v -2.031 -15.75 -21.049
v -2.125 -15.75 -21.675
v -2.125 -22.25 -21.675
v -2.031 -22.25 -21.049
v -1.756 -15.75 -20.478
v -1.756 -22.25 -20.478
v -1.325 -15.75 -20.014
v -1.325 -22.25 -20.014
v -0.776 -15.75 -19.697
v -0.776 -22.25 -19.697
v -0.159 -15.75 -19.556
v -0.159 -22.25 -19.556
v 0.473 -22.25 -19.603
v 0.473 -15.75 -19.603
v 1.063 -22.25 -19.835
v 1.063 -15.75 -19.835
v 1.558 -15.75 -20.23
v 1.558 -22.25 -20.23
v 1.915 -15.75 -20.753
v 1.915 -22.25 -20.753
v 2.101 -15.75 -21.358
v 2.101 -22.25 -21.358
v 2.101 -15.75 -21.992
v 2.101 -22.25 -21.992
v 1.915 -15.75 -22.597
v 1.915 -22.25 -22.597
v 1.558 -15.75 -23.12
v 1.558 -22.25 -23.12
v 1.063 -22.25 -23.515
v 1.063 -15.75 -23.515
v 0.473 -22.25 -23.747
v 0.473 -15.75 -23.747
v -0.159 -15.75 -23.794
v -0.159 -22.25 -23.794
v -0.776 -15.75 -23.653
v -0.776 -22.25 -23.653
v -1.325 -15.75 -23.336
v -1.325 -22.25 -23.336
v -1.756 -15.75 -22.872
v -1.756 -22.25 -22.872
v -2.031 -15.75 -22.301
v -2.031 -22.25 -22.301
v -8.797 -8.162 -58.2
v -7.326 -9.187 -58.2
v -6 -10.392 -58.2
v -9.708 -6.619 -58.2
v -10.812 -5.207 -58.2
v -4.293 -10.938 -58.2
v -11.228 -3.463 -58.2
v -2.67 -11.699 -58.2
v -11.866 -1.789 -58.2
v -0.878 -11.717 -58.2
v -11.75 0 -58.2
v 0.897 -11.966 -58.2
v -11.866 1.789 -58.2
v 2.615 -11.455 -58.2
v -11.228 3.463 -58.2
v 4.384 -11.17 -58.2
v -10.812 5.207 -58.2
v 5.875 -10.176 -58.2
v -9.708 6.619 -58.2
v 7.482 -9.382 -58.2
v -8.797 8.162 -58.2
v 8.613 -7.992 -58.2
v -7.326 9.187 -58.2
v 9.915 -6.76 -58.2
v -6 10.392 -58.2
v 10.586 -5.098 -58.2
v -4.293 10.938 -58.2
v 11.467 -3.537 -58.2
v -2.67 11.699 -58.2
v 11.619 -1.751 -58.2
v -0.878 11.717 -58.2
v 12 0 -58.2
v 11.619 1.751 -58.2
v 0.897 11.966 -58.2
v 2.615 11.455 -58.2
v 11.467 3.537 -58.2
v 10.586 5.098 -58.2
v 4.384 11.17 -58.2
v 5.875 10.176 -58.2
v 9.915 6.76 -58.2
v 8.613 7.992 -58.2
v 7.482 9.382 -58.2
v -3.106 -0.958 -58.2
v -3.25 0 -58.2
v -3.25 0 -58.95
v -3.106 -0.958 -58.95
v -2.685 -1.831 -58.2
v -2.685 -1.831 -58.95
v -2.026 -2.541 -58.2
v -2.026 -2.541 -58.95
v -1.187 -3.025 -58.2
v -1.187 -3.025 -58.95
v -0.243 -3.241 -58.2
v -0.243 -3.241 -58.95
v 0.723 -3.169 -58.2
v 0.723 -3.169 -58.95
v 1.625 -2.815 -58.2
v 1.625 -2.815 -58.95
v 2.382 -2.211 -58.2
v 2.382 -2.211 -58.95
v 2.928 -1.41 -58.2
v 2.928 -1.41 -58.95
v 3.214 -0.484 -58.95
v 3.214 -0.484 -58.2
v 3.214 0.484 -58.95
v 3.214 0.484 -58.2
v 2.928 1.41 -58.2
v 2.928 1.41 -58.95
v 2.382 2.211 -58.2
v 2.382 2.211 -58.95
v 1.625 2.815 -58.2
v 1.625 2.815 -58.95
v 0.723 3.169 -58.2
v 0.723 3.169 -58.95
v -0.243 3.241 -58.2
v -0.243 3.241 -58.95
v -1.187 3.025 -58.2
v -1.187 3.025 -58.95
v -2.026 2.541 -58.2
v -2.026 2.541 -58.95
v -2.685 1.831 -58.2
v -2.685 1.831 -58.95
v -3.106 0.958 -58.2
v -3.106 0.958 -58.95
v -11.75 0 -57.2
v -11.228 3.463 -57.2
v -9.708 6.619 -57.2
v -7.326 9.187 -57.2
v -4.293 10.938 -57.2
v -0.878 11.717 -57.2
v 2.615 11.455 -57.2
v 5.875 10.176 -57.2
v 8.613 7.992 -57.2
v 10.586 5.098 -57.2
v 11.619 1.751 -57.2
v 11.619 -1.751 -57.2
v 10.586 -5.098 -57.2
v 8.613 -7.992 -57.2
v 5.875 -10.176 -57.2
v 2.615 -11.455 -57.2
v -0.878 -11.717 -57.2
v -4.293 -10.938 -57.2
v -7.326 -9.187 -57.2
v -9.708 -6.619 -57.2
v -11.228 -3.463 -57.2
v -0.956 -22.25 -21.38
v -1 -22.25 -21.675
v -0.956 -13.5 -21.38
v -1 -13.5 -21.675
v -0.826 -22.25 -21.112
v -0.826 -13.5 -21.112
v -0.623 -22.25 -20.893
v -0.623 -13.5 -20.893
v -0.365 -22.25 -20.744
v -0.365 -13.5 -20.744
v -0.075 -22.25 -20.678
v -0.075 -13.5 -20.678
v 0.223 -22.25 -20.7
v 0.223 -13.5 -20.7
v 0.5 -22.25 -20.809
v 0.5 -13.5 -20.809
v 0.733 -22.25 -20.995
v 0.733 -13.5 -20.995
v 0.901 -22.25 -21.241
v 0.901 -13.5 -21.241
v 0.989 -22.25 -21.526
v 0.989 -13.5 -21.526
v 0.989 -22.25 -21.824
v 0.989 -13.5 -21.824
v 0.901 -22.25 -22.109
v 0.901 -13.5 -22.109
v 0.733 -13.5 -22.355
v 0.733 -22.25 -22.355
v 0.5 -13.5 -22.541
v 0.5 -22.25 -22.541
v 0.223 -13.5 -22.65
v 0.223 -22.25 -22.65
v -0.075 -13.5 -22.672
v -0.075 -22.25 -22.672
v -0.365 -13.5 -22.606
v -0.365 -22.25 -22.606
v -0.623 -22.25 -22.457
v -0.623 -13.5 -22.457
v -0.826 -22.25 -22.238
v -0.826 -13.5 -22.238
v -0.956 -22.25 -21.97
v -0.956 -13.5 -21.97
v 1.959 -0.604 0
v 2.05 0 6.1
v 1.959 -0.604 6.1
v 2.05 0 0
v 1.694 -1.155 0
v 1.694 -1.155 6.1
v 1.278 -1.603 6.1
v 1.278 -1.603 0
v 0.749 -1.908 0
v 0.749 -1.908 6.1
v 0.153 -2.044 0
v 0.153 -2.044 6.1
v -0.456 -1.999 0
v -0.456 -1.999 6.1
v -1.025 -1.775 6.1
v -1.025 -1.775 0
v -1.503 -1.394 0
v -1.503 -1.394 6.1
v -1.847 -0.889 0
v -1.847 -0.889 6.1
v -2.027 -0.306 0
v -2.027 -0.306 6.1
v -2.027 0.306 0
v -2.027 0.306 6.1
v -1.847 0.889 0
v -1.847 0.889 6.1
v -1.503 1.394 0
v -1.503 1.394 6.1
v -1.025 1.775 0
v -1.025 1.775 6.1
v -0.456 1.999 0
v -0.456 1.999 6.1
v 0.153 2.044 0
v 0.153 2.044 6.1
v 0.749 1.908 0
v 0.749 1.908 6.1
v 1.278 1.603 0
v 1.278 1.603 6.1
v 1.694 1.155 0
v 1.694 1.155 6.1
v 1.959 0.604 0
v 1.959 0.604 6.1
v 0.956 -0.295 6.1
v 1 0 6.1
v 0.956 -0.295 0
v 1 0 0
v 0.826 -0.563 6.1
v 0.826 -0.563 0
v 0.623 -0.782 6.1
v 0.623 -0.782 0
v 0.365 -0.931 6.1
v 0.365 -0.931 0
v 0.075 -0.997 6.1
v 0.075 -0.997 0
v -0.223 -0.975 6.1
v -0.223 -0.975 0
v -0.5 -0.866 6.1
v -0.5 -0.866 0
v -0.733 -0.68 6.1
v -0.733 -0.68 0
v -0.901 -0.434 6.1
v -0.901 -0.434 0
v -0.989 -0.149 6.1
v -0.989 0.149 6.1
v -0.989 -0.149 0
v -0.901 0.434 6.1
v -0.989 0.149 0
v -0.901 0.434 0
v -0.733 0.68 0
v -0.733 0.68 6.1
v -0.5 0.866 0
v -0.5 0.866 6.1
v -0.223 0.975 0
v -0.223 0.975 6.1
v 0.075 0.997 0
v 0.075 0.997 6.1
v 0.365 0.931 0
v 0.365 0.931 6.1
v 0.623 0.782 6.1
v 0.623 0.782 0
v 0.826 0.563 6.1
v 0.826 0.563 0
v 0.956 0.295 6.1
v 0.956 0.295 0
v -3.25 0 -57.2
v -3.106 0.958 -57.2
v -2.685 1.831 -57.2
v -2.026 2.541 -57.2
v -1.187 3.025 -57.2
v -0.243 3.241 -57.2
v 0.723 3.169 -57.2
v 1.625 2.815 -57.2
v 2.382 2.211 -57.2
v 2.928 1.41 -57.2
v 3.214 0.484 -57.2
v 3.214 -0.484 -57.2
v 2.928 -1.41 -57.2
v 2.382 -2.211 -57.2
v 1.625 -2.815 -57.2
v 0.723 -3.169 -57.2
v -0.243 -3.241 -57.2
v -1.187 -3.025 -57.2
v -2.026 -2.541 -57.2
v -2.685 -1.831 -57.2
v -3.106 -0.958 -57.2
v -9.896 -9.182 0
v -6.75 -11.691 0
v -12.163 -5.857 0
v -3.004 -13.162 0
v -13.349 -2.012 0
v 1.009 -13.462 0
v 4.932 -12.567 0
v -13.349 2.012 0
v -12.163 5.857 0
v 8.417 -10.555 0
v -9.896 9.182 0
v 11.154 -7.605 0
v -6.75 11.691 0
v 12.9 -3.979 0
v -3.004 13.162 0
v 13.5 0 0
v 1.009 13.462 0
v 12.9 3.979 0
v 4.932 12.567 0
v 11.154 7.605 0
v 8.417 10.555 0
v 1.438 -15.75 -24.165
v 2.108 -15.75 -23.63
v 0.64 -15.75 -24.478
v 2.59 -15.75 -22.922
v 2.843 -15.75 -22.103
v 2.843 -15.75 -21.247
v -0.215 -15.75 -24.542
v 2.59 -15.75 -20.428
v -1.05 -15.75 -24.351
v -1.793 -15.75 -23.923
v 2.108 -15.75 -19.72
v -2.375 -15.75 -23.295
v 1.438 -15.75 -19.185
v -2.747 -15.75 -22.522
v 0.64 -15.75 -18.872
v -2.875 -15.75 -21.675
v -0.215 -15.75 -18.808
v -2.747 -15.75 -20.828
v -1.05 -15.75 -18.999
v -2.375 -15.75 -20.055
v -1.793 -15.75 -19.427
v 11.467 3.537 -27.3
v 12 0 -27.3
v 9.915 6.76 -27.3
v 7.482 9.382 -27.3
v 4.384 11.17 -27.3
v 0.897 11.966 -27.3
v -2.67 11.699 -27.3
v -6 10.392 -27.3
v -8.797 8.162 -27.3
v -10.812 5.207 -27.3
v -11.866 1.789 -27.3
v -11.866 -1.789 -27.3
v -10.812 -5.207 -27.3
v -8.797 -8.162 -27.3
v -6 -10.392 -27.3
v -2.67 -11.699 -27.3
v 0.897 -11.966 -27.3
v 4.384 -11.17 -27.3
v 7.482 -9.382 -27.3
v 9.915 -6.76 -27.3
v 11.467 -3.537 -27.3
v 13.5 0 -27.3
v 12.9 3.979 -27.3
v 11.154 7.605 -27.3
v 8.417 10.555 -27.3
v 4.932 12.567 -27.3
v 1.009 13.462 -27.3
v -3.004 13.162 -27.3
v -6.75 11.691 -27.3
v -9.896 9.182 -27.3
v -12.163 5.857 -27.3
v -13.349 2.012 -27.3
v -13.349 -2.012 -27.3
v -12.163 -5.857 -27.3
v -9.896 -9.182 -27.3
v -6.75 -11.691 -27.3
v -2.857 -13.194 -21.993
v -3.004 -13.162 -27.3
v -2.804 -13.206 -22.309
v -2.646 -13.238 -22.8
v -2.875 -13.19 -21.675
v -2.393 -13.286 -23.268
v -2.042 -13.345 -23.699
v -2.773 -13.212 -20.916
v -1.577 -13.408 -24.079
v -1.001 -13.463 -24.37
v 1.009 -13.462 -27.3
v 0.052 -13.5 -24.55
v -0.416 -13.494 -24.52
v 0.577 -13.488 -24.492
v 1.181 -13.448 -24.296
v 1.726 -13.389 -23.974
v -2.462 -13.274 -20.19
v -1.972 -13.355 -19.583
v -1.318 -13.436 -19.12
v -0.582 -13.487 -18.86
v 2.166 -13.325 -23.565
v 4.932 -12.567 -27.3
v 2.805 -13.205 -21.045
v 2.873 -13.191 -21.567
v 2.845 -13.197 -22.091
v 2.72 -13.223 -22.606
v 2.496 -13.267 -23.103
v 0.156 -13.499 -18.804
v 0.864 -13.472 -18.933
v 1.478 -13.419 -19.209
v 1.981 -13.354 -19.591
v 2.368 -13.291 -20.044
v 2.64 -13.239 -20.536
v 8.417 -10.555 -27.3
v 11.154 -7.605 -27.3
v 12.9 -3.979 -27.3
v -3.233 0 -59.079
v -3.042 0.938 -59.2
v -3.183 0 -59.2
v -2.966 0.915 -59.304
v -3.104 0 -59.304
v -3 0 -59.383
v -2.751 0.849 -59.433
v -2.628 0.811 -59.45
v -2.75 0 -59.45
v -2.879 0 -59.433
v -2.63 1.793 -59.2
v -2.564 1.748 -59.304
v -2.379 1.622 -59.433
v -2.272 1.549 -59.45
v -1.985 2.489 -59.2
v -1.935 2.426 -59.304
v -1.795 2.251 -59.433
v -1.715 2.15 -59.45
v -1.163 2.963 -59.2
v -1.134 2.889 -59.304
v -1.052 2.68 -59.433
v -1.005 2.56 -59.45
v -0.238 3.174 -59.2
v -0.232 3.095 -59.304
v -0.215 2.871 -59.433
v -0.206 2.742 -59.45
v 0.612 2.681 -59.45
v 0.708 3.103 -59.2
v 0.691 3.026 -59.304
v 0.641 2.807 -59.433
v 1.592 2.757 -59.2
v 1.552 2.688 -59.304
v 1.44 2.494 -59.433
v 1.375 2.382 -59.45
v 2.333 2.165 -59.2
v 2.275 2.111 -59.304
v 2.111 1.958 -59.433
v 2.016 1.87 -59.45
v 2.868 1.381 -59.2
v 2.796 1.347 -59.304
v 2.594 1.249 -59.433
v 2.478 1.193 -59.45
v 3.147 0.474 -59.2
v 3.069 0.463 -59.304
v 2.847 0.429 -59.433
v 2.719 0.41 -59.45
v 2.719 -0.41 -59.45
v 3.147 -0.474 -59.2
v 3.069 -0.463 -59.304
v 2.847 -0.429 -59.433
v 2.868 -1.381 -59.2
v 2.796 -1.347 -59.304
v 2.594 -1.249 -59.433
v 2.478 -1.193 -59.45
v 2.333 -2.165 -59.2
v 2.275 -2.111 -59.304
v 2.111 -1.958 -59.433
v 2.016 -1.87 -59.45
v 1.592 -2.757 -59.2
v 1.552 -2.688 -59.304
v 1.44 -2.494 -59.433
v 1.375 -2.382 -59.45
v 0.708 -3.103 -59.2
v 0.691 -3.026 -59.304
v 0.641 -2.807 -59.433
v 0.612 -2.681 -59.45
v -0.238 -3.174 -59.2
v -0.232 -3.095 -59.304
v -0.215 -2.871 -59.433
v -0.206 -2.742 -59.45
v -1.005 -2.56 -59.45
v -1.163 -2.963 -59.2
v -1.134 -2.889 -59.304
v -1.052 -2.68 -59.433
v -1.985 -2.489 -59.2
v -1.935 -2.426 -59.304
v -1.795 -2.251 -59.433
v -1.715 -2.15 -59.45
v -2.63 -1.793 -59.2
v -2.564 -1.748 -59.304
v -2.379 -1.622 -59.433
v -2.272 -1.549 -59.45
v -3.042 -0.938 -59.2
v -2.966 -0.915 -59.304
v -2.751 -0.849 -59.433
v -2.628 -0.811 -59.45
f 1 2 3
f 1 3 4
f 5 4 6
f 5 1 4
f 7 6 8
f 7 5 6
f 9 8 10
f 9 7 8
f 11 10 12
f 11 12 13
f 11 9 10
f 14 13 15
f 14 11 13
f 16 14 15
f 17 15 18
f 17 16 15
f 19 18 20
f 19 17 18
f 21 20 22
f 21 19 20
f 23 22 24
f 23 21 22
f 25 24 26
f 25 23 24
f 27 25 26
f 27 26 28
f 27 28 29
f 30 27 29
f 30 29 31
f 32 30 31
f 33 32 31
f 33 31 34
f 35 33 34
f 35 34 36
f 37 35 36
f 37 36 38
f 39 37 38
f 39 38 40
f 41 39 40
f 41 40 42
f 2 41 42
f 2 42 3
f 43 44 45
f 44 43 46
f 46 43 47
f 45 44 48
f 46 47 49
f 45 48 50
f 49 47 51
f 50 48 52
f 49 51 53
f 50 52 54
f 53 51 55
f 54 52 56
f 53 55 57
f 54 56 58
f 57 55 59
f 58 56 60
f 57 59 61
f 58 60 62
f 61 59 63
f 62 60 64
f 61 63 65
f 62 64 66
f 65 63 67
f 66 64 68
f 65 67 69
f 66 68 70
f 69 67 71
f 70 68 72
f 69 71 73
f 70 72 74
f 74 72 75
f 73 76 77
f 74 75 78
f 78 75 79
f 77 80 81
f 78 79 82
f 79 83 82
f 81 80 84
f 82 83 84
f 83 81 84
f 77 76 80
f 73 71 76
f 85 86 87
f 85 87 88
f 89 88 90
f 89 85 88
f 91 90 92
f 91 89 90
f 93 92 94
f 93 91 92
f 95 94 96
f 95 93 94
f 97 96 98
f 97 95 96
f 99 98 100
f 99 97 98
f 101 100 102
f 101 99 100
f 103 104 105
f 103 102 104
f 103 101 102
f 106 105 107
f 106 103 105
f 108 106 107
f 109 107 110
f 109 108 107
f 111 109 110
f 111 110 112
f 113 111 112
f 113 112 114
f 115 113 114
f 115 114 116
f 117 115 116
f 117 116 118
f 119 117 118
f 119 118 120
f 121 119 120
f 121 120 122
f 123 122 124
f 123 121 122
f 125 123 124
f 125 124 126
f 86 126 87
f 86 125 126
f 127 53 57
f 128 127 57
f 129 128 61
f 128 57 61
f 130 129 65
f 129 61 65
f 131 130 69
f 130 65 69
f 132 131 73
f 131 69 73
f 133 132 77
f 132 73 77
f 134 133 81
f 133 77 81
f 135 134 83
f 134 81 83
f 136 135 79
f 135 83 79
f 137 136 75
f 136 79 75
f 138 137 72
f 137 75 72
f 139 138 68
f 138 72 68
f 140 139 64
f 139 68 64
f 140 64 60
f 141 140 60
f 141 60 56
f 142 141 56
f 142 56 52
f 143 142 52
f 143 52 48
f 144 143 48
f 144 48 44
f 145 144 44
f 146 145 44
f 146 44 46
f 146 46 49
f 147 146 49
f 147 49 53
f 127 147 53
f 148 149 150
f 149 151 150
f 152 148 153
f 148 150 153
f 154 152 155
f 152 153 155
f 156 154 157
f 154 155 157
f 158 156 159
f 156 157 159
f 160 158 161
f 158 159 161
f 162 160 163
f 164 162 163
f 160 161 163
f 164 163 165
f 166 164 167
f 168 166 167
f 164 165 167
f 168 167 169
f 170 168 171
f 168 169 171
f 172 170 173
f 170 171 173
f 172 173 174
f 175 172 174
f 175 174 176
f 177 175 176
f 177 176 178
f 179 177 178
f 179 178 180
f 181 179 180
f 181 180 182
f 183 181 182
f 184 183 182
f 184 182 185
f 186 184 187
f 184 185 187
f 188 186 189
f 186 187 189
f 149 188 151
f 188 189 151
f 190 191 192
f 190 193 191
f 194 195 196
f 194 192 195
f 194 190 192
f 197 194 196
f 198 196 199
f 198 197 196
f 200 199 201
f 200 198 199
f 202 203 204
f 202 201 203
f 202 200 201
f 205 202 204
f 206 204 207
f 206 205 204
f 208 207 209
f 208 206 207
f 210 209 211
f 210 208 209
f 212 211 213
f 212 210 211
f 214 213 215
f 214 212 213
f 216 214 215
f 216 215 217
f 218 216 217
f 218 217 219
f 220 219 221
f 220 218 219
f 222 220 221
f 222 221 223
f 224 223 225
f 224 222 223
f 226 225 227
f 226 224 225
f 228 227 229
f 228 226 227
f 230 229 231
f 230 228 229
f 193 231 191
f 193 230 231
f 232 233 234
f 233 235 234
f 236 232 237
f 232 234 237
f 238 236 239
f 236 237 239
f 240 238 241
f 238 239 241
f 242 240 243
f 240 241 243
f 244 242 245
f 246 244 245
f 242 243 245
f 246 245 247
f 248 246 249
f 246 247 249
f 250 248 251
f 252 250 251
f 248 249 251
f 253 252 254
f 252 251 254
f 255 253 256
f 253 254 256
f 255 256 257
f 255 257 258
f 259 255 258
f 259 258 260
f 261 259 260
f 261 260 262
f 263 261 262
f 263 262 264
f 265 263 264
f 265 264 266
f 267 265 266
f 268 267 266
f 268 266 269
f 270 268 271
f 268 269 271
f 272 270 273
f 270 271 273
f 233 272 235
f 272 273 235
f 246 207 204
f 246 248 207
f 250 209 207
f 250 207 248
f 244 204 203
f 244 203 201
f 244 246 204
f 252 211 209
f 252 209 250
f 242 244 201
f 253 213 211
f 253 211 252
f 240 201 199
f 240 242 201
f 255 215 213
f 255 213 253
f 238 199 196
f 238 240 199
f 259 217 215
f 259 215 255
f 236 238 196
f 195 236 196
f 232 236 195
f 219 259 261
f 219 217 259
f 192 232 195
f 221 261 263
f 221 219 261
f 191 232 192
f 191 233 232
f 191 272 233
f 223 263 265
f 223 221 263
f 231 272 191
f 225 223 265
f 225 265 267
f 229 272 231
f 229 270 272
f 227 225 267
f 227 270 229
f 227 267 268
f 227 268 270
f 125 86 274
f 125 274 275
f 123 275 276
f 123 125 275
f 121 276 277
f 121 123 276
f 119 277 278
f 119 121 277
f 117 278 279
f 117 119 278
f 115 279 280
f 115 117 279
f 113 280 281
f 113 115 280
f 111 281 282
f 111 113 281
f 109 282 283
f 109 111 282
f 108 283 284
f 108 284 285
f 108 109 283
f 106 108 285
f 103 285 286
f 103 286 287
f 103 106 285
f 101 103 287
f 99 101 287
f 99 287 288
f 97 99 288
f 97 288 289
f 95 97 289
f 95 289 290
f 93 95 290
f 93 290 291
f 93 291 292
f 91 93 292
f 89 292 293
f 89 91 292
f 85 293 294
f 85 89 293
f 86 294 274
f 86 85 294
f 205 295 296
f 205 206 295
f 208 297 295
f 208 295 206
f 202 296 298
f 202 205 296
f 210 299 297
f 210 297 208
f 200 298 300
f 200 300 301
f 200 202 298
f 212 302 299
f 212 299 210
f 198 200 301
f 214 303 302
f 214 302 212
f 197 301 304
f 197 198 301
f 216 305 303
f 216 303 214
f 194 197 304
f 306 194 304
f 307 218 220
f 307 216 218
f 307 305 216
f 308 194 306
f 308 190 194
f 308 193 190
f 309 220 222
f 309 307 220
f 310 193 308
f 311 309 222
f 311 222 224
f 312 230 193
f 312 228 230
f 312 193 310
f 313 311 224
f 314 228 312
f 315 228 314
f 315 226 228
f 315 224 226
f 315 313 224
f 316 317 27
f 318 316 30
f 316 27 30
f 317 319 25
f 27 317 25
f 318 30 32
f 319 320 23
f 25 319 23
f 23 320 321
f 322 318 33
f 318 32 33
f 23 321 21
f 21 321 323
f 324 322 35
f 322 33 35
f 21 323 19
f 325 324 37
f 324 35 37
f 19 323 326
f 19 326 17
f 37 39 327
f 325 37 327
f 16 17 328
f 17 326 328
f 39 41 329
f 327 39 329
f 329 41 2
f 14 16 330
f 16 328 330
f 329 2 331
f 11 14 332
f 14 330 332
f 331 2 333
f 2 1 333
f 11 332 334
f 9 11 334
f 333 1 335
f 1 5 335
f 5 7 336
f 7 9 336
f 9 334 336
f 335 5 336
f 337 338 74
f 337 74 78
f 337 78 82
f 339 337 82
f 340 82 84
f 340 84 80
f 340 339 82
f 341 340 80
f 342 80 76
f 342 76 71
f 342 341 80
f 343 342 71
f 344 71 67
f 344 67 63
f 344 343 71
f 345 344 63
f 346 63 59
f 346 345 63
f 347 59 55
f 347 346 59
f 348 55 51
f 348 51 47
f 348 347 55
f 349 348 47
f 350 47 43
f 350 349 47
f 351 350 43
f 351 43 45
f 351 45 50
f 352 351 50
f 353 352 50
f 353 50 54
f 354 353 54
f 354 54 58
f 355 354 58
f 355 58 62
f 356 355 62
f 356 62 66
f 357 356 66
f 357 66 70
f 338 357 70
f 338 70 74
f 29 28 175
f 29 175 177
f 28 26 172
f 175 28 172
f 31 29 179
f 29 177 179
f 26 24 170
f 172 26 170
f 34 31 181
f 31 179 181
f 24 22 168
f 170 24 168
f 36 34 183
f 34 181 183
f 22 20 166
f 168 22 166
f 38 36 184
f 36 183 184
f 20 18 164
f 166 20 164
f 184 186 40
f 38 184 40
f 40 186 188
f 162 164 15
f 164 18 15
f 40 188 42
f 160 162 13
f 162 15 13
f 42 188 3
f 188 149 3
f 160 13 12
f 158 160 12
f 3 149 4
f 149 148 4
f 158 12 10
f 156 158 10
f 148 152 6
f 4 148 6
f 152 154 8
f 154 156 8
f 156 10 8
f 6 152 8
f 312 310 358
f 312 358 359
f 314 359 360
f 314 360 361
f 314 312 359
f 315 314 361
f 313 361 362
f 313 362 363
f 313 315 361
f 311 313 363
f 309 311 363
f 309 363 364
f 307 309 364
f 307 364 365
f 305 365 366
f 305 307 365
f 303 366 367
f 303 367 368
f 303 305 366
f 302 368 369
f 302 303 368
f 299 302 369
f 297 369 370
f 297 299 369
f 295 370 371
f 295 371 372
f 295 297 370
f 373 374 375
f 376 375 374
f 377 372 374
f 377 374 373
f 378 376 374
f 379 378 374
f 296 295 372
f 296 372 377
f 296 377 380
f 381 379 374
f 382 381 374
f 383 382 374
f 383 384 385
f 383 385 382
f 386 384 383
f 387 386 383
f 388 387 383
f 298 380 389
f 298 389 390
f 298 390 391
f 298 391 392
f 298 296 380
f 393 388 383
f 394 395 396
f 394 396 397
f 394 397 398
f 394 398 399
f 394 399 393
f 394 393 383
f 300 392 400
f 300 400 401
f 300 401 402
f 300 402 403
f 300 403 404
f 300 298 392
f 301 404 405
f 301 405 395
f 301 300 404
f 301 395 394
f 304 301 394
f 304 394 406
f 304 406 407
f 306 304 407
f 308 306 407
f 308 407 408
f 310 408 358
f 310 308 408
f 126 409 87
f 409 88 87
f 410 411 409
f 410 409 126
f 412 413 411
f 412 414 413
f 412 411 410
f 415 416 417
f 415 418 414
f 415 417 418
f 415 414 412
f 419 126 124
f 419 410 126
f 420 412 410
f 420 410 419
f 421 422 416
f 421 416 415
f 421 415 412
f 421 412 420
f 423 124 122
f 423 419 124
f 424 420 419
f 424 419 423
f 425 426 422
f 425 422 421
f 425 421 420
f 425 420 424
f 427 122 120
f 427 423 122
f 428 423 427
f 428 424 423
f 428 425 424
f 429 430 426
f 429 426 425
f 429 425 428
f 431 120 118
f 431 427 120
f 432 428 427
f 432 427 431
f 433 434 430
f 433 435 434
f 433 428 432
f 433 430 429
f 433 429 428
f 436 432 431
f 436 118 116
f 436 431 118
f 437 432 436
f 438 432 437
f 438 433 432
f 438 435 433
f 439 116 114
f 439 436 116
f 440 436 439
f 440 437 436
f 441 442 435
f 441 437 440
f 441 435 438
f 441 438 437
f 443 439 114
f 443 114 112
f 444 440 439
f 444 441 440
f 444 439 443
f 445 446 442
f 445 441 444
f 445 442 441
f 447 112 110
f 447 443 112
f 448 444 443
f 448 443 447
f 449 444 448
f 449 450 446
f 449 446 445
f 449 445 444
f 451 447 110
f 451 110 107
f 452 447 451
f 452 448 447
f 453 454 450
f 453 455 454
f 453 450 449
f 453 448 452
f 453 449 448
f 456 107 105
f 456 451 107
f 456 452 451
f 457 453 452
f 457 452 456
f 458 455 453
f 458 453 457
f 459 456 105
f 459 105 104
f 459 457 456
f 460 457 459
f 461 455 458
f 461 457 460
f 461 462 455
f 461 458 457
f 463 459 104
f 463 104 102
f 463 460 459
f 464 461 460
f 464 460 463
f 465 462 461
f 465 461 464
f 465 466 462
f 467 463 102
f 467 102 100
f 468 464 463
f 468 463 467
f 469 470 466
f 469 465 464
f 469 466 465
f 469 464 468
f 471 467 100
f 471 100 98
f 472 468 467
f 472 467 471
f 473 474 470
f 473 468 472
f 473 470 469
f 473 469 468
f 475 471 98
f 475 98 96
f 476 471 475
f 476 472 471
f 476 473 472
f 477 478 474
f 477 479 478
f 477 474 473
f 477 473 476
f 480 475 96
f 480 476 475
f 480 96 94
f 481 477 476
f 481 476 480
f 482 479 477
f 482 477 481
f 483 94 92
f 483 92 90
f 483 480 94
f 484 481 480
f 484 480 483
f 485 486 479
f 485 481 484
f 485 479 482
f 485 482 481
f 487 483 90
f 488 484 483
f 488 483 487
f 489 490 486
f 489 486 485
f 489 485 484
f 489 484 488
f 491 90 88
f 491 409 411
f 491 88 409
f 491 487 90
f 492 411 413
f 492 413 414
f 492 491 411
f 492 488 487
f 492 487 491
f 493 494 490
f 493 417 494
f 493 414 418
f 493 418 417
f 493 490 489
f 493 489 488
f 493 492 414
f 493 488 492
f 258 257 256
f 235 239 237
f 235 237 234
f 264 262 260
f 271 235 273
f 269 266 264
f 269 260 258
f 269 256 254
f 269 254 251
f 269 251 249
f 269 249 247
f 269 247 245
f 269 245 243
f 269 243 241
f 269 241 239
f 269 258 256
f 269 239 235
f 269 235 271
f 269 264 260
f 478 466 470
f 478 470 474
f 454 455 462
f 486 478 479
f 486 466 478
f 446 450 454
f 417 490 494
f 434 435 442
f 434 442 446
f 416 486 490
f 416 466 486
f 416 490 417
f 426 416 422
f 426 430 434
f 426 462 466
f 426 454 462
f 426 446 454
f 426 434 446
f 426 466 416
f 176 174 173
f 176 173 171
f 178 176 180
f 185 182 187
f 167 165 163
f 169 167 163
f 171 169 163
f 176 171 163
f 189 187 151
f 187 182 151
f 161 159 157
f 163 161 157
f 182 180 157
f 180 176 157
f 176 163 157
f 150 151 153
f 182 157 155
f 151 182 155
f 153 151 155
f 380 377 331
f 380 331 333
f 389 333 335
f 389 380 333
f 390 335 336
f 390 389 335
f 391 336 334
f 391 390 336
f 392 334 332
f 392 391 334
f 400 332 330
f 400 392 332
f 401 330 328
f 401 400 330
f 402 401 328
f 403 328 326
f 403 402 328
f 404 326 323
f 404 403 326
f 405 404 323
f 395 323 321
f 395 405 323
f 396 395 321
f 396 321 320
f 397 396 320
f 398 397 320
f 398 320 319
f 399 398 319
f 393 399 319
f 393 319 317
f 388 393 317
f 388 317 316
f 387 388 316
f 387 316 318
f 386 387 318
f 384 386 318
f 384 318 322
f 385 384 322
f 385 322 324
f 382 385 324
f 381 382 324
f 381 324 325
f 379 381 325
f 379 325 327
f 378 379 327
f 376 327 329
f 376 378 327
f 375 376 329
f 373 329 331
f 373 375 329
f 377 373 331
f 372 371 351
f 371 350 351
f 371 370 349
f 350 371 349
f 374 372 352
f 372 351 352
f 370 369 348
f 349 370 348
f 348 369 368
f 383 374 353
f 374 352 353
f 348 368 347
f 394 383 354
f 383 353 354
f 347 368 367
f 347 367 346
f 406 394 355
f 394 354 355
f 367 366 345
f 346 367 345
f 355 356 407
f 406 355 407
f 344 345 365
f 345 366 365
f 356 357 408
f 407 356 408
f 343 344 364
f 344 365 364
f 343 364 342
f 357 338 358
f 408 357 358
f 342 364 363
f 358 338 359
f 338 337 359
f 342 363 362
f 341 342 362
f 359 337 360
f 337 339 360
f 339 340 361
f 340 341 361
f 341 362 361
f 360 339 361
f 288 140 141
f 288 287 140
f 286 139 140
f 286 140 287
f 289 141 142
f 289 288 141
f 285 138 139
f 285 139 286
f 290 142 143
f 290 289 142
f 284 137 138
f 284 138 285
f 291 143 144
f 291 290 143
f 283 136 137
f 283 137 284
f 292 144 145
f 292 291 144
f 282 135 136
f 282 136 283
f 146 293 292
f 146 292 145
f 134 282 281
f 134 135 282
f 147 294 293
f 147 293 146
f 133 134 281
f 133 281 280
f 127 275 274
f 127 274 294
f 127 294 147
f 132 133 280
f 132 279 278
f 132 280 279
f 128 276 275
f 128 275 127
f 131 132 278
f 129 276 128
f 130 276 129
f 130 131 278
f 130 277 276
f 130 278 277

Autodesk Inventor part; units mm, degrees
ref_plane "YZ Plane" through (0, 0, 0) normal (1, 0, 0) x (0, 1, 0)
ref_plane "XY Plane" through (0, 0, 0) normal (0, 0, 1) x (1, 0, 0)
sketch "Sketch1" plane through (0, 0, 0) normal (0, 0, 1) x (1, 0, 0)
  circle A0 centre (0, 0) radius 13.5
  circle A1 centre (0, 0) radius 2.05
  circle A2 centre (0, 0) radius 12
  circle A3 centre (0, 0) radius 1
  dimension "d0" = 27
  dimension "d3" = 4.1
  dimension "d6" = 24
  dimension "d20" = 2
extrude "Extrusion1" add sketch "Sketch1" against normal blind 27.3 contours A0 | A1 | A2 | A3
extrude "Extrusion2" add sketch "Sketch1" along normal blind 6.1 contours A1 | A3
extrude "Extrusion3" add sketch "Sketch1" against normal blind 58.2 contours A1 | A2 | A3
ref_plane "Work Plane1" through (0, -13.5, 0) normal (0, 1, 0) x (-1, 0, 0)
sketch "Sketch2" plane through (0, -13.5, 0) normal (0, 1, 0) x (-1, 0, 0)
  circle A0 centre (0, -21.675) radius 2.875
  circle A1 centre (0, -21.675) radius 2.125
  line L0 (13.5, 0) -> (-13.5, 0) projected
  circle A2 centre (0, -21.675) radius 1
  point P0 (0, 0)
  dimension "d10" = 5.75
  dimension "d11" = 21.675
  dimension "d12" = 4.25
  dimension "d17" = 2
extrude "Extrusion4" add sketch "Sketch2" along normal mid plane 4.5 contours A0 | A1 | A2
extrude "Extrusion5" add sketch "Sketch2" against normal blind 8.75 contours A1 | A2
extrude "Extrusion6" cut sketch "Sketch2" against normal through all contours A2
extrude "Extrusion7" cut sketch "Sketch1" along normal through all contours A3
sketch "Sketch3" plane through (0, 0, -58.2) normal (0, 0, -1) x (-1, 0, 0)
  circle A0 centre (0, 0) radius 3.25
  circle A1 centre (0, 0) radius 11.75
  dimension "d23" = 6.5
  dimension "d26" = 23.5
extrude "Extrusion9" cut sketch "Sketch3" against normal blind 1
extrude "Extrusion10" add sketch "Sketch3" along normal blind 1.25 contours A0
fillet "Fillet1" radius 0.5 1 edges at (3.25, 0, -59.45)
equation "\"d9\" = -0.5 * d0"
properties part number "Adafruit_1528_4699_ND"
